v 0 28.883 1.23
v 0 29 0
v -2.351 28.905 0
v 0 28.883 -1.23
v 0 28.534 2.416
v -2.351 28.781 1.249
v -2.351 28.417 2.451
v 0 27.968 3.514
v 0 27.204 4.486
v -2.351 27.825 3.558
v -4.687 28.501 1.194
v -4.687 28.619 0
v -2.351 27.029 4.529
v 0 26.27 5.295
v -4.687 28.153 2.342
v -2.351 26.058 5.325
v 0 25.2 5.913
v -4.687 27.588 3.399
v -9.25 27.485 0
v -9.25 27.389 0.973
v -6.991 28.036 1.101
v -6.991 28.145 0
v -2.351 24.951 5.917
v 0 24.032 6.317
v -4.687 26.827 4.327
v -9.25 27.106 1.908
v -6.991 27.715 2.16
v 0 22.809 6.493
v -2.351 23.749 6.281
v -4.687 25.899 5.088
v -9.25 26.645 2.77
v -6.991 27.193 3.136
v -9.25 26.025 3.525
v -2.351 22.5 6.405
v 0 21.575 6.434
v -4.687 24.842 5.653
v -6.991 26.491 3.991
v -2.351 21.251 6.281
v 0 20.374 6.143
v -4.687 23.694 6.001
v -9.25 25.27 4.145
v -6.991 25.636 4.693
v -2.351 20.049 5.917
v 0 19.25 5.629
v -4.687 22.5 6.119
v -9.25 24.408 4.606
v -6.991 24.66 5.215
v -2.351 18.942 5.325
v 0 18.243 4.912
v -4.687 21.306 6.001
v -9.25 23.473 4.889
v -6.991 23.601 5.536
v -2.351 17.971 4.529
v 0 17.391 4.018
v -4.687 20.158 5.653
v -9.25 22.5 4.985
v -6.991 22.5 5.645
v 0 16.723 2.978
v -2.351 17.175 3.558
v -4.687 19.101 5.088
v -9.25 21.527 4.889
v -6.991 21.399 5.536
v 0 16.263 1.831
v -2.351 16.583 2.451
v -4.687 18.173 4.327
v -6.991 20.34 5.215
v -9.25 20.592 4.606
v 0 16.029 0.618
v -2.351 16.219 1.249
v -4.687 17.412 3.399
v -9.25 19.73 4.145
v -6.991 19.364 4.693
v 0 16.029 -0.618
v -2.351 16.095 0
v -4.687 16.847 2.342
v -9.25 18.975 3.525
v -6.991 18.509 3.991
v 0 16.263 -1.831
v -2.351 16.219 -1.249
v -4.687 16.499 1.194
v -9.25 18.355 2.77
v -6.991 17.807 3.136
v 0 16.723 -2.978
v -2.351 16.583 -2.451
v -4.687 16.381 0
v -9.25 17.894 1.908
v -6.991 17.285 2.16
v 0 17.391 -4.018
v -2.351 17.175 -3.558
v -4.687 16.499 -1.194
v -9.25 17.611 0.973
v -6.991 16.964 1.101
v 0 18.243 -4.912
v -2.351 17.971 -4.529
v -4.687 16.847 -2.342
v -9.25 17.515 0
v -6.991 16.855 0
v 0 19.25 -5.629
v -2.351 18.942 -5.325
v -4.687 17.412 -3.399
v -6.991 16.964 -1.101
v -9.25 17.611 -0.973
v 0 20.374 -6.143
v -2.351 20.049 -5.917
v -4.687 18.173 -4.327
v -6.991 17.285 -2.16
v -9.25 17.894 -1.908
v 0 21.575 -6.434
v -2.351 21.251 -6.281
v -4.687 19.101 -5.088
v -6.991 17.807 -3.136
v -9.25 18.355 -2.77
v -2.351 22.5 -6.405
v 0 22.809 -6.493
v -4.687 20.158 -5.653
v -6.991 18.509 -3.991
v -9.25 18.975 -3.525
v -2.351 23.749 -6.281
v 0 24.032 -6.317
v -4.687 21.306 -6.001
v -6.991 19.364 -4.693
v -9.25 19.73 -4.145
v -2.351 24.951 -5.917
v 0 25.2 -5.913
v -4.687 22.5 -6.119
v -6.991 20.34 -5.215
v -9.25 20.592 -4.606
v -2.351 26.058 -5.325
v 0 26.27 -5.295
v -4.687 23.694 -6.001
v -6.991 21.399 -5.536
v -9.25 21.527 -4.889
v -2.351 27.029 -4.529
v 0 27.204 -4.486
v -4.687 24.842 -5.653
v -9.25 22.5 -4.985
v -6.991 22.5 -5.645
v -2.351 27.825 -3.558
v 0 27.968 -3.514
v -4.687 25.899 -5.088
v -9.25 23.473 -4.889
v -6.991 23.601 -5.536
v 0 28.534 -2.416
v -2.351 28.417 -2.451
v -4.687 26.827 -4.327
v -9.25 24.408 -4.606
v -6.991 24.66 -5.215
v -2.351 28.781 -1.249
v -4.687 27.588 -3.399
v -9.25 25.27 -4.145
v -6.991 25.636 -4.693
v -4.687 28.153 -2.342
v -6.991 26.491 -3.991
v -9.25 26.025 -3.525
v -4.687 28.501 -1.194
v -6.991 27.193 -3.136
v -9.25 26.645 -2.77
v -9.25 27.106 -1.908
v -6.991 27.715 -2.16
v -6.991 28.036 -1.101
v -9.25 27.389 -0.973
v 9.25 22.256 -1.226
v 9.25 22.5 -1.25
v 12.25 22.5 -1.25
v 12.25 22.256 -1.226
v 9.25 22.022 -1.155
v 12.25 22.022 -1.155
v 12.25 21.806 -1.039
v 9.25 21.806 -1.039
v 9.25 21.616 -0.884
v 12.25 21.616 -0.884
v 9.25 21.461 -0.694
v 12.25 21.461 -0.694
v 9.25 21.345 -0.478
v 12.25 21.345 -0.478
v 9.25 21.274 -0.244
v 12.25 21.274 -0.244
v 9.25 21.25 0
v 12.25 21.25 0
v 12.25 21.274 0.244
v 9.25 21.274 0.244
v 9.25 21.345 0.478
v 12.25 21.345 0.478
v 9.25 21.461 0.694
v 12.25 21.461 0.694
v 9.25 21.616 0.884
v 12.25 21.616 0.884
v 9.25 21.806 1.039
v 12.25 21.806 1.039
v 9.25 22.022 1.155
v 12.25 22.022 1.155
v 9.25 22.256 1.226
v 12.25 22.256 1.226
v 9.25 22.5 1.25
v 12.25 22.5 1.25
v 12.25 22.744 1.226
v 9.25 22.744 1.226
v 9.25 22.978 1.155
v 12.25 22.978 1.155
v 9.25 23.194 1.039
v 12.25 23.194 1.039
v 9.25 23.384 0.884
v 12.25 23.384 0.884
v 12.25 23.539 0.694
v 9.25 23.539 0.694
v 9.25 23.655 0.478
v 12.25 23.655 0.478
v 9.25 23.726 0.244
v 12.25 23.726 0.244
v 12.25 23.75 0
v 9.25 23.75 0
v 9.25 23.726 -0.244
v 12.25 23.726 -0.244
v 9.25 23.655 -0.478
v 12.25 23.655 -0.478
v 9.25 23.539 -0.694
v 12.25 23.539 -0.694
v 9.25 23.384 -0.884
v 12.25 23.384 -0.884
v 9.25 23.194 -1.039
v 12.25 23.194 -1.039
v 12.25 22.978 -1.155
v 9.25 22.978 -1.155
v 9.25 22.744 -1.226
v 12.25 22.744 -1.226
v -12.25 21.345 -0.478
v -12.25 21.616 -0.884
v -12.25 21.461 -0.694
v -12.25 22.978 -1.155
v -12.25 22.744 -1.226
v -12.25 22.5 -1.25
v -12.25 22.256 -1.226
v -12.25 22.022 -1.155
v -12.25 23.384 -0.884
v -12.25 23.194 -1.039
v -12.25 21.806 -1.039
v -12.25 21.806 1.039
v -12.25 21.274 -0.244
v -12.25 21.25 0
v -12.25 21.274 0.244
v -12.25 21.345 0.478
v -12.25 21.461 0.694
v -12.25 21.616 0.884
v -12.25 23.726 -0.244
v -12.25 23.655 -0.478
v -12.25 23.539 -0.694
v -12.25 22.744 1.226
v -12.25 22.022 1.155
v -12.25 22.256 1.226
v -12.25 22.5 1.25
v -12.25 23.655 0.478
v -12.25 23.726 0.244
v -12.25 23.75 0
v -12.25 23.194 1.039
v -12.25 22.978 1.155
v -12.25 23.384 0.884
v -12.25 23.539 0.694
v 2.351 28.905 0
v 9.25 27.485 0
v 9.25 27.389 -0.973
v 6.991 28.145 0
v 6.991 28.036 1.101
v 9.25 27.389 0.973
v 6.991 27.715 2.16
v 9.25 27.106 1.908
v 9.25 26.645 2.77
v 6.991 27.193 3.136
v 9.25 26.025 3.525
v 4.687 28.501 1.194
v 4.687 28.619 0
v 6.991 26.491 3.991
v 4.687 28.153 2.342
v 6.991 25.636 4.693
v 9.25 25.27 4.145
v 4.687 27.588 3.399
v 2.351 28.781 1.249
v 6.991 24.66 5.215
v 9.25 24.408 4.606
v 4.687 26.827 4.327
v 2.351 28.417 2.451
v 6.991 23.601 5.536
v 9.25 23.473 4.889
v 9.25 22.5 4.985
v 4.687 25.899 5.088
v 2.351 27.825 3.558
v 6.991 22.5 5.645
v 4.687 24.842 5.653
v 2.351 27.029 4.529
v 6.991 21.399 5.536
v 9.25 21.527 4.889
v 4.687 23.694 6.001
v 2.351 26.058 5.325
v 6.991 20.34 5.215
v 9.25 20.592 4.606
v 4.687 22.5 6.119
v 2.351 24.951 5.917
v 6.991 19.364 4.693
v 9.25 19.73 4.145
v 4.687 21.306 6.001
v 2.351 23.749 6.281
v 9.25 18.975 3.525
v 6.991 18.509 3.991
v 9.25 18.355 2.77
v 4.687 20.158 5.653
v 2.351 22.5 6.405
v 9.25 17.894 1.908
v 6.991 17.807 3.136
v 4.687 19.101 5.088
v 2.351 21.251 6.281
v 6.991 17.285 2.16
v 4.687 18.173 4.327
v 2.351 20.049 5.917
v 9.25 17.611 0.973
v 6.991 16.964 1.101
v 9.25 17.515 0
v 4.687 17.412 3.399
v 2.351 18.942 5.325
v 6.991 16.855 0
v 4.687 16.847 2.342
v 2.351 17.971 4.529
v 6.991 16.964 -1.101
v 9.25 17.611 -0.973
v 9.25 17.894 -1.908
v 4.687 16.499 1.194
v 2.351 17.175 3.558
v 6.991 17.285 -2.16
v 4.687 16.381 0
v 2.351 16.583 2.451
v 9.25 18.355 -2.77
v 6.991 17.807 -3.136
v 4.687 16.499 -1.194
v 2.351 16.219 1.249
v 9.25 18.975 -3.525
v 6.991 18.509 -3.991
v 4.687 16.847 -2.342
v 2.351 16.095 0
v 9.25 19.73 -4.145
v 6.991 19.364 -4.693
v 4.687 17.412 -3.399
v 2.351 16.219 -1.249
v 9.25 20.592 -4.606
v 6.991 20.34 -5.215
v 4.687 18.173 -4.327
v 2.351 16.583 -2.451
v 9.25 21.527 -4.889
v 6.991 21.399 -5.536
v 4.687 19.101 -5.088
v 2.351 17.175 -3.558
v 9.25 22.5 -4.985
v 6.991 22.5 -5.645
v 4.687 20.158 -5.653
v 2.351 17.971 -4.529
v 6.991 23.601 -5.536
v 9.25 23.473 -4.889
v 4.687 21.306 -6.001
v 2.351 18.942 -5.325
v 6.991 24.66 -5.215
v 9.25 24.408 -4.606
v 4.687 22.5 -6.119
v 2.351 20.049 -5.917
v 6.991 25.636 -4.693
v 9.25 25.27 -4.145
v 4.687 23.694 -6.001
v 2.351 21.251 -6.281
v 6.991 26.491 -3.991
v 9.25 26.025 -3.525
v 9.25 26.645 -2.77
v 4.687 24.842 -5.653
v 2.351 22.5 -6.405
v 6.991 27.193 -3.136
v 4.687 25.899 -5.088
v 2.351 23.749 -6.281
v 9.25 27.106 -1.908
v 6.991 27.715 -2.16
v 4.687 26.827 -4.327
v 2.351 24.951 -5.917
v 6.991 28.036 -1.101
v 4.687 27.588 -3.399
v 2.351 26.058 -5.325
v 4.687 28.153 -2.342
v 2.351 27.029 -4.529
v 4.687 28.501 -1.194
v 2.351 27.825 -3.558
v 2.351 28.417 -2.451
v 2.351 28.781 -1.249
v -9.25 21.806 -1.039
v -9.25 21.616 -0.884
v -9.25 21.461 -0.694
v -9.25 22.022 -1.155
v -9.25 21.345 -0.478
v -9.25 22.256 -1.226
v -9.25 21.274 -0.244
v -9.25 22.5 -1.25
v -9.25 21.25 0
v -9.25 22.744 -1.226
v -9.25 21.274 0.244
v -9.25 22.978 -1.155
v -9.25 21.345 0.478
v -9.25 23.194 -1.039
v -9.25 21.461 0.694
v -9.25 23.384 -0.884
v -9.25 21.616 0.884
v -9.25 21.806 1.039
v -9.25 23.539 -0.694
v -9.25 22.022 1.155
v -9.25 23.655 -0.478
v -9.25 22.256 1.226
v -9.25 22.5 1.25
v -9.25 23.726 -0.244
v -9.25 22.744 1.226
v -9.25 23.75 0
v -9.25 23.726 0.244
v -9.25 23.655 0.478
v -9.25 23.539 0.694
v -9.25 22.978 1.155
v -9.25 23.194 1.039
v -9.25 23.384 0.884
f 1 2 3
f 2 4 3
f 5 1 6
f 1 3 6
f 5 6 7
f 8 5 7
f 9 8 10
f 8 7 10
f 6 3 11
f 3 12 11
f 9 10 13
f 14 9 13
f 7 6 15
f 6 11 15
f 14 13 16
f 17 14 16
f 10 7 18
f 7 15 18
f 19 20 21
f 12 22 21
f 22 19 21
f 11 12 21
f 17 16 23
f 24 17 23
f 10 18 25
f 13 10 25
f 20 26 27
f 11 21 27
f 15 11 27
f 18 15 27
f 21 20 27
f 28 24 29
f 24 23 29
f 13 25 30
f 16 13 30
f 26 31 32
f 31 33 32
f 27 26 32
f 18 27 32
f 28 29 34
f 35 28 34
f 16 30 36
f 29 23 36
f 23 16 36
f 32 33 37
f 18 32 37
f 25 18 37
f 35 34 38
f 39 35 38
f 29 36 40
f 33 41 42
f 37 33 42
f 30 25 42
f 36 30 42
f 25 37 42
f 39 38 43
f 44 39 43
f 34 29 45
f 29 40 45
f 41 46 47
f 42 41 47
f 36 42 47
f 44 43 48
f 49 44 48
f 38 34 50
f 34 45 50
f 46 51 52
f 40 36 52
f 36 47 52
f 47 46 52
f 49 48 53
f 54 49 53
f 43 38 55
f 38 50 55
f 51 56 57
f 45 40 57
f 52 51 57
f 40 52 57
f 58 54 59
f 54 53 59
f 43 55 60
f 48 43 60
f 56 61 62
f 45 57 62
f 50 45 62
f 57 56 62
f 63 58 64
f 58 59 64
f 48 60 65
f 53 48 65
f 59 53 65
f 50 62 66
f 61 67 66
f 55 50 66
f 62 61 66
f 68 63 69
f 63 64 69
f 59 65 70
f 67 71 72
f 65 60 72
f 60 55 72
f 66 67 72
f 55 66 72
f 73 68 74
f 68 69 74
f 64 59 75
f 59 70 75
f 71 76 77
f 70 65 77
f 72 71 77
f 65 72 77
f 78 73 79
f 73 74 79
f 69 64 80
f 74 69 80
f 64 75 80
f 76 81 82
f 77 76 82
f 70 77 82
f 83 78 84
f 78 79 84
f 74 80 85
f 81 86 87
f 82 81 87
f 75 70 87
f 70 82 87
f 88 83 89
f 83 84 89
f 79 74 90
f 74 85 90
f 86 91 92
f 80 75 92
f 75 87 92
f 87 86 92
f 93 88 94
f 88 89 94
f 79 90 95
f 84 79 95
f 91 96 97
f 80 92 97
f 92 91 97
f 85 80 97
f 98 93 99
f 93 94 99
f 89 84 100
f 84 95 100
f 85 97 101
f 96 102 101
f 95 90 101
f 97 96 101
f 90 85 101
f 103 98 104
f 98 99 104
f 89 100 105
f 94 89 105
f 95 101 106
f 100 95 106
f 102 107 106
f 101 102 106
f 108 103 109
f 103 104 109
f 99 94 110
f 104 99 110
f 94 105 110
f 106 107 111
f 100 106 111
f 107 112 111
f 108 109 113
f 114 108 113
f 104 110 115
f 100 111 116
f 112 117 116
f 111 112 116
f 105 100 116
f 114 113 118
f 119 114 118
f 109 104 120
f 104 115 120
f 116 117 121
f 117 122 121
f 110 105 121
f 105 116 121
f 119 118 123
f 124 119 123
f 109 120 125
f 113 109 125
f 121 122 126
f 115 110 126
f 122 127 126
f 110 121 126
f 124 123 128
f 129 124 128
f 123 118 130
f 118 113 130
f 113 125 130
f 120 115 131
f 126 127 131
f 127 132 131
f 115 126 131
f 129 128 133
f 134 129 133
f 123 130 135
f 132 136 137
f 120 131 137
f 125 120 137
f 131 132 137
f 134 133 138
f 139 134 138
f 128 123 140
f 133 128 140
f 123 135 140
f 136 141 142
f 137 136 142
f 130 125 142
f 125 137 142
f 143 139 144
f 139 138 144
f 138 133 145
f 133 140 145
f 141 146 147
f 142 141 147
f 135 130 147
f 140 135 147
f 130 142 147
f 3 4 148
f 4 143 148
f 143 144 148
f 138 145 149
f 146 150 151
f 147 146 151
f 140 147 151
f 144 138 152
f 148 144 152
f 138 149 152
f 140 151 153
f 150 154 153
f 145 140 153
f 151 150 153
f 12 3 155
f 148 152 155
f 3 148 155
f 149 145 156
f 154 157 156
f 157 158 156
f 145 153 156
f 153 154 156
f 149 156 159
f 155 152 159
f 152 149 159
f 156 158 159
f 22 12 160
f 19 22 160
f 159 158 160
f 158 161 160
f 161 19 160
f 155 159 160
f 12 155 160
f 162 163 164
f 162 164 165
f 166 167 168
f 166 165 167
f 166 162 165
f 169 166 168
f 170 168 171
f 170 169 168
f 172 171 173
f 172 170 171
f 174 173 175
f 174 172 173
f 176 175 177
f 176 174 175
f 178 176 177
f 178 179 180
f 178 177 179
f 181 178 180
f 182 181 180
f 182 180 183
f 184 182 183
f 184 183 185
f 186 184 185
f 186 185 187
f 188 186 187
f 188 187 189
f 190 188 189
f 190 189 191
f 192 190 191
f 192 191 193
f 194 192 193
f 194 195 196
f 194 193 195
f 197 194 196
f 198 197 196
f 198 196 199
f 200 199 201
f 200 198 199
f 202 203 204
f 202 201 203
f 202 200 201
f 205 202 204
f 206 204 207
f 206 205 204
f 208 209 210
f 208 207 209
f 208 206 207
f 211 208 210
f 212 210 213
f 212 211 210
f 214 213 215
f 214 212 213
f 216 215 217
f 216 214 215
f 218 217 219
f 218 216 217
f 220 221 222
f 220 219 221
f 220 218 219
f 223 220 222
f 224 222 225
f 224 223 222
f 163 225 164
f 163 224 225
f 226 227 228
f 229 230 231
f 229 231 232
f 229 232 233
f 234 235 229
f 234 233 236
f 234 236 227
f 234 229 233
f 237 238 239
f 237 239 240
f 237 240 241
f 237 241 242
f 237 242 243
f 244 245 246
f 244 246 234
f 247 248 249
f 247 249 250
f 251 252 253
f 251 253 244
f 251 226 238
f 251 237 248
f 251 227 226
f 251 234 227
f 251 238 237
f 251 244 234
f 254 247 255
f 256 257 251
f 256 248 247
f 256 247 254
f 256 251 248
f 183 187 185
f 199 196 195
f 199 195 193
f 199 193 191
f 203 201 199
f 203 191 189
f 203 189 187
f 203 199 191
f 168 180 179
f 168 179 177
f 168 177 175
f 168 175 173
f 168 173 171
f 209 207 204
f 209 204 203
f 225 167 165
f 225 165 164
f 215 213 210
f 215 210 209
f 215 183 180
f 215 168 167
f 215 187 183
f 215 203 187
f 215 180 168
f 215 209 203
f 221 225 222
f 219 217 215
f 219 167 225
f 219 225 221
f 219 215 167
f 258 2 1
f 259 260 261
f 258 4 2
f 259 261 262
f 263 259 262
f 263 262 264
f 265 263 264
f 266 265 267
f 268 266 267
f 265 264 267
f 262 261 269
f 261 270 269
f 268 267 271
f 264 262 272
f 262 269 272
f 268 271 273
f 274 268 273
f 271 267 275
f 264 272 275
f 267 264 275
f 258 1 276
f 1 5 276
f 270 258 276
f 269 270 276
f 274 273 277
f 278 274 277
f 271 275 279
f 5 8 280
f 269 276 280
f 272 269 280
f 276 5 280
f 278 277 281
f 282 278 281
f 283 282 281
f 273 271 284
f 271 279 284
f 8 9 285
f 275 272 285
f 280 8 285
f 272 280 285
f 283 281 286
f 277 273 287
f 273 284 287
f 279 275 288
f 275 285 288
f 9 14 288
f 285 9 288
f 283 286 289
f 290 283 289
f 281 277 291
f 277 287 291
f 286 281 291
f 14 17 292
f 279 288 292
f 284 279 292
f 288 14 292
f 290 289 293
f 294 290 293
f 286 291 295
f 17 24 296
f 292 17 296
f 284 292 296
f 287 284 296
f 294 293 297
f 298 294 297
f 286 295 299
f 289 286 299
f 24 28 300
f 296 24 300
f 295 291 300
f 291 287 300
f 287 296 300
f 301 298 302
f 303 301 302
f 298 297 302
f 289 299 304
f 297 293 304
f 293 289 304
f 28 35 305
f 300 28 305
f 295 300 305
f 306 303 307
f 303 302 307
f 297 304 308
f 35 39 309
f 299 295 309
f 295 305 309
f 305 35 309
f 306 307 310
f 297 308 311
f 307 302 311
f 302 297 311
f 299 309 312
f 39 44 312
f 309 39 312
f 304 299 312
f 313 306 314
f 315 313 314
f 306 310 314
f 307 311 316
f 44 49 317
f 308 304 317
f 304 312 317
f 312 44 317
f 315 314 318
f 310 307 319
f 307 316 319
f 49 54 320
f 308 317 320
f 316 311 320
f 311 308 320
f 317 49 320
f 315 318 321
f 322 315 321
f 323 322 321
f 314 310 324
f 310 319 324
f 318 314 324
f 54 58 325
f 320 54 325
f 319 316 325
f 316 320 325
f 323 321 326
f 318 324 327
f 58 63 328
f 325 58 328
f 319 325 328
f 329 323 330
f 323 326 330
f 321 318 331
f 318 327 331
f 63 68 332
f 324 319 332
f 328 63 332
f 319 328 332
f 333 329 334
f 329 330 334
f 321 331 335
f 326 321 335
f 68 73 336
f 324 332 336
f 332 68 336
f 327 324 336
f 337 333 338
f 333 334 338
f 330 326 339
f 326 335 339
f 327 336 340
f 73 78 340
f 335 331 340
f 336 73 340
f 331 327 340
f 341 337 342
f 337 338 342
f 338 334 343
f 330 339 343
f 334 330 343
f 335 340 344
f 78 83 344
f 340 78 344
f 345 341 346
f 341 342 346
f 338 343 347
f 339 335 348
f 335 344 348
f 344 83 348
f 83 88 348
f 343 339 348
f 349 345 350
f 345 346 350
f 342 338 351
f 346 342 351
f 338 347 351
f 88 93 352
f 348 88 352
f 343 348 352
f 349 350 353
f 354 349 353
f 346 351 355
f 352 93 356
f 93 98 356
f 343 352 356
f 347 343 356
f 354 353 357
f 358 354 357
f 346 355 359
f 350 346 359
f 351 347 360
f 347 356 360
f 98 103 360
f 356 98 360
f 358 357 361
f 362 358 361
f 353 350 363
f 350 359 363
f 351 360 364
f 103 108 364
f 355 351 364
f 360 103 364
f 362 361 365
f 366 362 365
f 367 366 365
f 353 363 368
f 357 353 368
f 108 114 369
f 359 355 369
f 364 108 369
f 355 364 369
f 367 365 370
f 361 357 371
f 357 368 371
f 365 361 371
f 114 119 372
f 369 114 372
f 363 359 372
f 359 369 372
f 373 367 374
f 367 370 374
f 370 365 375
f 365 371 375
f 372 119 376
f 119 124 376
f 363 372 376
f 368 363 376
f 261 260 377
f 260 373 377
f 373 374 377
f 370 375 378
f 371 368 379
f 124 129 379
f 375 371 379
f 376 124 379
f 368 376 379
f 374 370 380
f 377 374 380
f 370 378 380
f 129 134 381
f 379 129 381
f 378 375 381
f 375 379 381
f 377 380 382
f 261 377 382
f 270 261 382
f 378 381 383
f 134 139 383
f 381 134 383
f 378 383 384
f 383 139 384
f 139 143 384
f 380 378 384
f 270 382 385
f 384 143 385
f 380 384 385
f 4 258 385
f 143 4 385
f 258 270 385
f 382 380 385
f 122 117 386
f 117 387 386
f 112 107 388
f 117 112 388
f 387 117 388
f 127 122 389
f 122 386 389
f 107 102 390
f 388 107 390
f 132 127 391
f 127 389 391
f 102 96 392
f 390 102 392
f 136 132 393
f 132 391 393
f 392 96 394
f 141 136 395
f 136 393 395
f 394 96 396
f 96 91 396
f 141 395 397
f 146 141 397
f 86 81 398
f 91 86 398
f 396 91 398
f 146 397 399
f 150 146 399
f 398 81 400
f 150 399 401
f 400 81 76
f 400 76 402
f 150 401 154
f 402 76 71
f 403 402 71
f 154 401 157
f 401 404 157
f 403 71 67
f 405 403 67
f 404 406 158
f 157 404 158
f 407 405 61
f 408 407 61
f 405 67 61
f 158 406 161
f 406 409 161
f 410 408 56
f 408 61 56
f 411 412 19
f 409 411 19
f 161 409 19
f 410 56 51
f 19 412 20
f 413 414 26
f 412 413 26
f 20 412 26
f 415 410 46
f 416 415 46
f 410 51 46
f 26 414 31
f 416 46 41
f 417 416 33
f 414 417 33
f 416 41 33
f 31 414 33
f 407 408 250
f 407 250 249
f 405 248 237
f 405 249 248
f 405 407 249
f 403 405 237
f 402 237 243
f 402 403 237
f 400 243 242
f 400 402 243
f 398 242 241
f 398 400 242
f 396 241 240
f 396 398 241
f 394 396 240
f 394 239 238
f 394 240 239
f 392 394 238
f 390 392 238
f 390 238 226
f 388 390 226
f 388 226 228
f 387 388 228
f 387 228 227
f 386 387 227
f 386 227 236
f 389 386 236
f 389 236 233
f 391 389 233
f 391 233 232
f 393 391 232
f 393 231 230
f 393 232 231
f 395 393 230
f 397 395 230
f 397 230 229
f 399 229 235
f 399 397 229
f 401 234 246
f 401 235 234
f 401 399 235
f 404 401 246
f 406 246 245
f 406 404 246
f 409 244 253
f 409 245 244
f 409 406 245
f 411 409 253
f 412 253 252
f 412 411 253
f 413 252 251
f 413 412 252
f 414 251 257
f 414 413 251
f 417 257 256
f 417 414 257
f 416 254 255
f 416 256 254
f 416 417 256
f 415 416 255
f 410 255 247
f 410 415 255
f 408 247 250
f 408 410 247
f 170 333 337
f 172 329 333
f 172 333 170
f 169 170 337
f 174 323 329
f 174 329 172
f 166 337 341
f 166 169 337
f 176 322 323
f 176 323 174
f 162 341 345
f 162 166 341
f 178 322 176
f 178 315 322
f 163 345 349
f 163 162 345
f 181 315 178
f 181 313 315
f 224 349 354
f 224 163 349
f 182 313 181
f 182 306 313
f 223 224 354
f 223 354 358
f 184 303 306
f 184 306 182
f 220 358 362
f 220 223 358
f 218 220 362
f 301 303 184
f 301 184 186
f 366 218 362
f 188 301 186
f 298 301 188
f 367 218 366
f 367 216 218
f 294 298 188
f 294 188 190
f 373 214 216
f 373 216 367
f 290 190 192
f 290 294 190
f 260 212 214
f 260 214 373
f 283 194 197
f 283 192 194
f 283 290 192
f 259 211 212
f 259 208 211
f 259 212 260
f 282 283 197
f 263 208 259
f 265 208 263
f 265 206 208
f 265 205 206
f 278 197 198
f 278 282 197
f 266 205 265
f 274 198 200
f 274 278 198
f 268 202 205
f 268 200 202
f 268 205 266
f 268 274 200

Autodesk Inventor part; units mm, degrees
ref_plane "YZ Plane" through (0, 0, 0) normal (1, 0, 0) x (0, 1, 0)
ref_plane "XZ Plane" through (0, 0, 0) normal (0, 1, 0) x (-1, 0, 0)
ref_plane "XY Plane" through (0, 0, 0) normal (0, 0, 1) x (1, 0, 0)
sketch "スケッチ1" plane through (0, 0, 0) normal (0, 0, 1) x (1, 0, 0)
  circle A0 centre (0, 0) radius 29
  line L0 (-9.25, 29) -> (9.25, 29)
  line L1 (9.25, 29) -> (9.25, 0)
  line L2 (9.25, 0) -> (-9.25, 0)
  line L3 (-9.25, 0) -> (-9.25, 29)
  line L4 (-9.25, 22.5) -> (9.25, 22.5)
  point P0 (9.25, 27.4852)
  point P1 (-9.25, 27.4852)
  dimension "d0" = 58
  dimension "d1" = 18.5
  dimension "d2" = 6.5
revolve "回転1" add sketch "スケッチ1" angle 360 about axis through (-9.25, 22.5, 0) along (1, 0, 0) contours L1 L4 L3 A0
sketch "スケッチ2" plane through (-9.25, 22.5, 0) normal (-1, 0, 0) x (0, 0, 1)
  circle A0 centre (0, 0) radius 1.25
  circle A1 centre (0, 0) radius 4.9852 projected
  point P0 (0, -22.5)
  dimension "d4" = 2.5
extrude "押し出し1" add sketch "スケッチ2" along normal blind 3 contours A0
sketch "スケッチ3" plane through (9.25, 22.5, 0) normal (1, 0, 0) x (0, 0, -1)
  circle A0 centre (0, 0) radius 1.25 projected
  point P0 (0, -22.5)
extrude "押し出し2" add sketch "スケッチ3" along normal blind 3
properties part number "roller" material "ゴム"
